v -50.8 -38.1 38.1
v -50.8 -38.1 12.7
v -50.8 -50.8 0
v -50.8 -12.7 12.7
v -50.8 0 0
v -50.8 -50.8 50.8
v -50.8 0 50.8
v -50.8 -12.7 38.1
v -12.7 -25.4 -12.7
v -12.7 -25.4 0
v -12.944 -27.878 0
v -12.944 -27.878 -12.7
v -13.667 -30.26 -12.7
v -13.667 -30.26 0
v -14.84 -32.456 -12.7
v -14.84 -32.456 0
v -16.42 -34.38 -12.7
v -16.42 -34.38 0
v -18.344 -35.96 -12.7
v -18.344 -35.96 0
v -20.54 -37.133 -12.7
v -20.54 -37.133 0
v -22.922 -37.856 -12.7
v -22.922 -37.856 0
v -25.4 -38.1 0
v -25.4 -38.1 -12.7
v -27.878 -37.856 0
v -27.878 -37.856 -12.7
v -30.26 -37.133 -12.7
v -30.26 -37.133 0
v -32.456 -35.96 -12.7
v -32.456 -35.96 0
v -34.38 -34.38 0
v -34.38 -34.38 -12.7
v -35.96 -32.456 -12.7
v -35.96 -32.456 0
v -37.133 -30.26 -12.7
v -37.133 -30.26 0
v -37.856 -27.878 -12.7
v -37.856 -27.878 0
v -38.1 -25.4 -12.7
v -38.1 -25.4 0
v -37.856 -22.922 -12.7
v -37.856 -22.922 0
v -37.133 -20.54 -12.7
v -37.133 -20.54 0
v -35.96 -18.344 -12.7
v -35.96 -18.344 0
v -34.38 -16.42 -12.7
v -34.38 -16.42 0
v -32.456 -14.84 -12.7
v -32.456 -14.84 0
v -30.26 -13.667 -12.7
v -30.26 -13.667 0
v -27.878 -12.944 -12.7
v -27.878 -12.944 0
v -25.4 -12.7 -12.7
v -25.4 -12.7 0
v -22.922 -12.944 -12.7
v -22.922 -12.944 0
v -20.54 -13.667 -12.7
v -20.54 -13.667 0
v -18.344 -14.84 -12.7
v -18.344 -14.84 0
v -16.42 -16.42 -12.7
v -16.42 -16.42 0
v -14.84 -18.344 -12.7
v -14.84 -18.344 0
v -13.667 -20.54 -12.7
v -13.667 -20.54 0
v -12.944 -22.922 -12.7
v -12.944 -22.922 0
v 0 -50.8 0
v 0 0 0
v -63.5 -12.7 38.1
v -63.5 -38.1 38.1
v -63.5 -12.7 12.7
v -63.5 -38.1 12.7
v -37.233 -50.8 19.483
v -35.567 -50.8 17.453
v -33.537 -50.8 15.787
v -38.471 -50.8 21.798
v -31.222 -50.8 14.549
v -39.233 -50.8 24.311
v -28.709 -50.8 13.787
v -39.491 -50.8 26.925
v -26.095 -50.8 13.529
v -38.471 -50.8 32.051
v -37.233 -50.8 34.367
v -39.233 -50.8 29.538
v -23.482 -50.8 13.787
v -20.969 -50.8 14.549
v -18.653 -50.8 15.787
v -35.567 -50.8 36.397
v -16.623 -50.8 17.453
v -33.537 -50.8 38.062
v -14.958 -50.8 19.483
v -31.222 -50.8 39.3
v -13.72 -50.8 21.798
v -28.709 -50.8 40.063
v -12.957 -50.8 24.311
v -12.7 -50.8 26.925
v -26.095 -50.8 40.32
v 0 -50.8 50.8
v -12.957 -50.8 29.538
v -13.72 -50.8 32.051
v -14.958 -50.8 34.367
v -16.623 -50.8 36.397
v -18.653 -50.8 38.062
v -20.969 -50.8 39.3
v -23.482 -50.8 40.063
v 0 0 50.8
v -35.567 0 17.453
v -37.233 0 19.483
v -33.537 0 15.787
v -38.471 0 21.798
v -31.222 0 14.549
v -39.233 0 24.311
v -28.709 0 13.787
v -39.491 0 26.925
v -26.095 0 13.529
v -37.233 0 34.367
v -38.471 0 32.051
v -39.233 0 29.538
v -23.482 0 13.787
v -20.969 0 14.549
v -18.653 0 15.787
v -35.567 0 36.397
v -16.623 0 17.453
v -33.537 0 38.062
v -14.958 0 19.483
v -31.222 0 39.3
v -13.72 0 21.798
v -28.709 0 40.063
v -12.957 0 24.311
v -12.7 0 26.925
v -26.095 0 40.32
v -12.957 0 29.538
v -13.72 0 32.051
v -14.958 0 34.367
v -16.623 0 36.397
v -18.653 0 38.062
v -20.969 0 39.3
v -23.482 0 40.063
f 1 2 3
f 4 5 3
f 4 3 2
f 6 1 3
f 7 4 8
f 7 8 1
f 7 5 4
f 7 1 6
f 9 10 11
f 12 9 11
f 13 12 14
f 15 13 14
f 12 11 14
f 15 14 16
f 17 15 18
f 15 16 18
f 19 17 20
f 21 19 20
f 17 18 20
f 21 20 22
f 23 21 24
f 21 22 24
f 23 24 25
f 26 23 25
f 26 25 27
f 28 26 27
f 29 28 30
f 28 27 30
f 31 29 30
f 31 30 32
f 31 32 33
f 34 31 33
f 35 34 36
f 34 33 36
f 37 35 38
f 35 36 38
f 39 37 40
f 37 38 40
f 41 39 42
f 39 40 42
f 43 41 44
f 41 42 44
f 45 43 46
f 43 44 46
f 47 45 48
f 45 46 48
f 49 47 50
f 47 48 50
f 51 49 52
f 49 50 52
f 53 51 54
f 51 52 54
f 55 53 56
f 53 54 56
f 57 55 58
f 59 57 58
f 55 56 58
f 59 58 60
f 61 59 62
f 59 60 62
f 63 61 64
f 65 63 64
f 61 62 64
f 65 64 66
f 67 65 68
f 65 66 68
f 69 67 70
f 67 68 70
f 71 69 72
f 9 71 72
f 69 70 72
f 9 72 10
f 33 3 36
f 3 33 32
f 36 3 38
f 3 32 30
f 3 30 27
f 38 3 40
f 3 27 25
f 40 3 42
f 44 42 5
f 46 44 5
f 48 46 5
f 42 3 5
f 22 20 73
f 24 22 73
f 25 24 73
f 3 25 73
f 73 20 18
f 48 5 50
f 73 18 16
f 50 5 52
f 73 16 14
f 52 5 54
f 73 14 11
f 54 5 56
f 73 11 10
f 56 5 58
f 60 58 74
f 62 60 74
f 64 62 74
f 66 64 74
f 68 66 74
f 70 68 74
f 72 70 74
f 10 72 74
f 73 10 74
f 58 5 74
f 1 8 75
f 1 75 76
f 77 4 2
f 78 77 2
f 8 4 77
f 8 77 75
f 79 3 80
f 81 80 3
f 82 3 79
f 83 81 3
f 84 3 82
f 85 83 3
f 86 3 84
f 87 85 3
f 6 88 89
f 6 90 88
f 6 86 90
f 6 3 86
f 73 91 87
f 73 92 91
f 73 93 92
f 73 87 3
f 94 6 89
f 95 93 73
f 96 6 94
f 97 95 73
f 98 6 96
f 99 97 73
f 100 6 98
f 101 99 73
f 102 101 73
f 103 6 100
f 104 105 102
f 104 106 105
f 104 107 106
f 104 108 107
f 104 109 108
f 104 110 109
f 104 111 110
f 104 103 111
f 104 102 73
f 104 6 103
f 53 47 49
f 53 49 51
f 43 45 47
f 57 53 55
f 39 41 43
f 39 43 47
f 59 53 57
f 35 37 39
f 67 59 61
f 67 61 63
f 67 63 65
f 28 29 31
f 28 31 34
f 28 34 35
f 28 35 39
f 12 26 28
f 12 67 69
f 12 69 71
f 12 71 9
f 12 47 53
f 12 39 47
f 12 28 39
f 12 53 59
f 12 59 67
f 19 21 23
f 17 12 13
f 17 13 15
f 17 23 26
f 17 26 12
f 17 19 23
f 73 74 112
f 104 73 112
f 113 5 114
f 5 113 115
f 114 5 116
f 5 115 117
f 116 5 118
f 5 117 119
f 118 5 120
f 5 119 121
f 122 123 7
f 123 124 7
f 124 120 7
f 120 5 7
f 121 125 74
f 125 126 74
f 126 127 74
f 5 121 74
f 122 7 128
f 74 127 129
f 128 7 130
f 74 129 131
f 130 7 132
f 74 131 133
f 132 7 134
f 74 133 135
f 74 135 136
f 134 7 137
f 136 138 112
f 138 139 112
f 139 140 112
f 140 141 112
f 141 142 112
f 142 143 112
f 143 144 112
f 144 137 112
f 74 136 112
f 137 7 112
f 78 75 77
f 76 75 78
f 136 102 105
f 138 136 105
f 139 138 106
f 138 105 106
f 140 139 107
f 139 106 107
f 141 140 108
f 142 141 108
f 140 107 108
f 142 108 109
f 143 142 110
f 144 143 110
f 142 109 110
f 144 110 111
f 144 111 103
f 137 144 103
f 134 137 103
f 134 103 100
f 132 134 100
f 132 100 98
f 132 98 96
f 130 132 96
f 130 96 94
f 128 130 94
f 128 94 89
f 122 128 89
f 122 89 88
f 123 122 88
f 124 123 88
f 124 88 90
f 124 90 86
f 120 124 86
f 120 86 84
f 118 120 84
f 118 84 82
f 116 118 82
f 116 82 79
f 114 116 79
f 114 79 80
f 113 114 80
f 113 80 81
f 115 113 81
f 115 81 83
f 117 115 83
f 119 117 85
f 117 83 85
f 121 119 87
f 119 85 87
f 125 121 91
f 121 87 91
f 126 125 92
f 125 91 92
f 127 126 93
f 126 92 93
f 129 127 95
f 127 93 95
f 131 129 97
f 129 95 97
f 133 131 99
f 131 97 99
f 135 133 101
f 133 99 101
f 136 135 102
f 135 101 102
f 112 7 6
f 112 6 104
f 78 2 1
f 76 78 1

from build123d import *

# Parameters (mm, degrees)
F0_W     = 50.8
F0_H     = 50.8
F1_DEPTH = 50.8
F2_R     = 13.395396
F3_DEPTH = 61.722
F4_W     = 25.4
F4_H     = 25.4
F5_DEPTH = 12.7
F6_R     = 12.7
F7_DEPTH = 12.7


with BuildPart() as f1:
    # F0 (on Front) → F1 (new body)
    with BuildSketch(Plane.XZ):
        with Locations((-25.4, 25.4)):
            Rectangle(F0_W, F0_H)
    extrude(amount=F1_DEPTH)

    # F2 (on face) → F3 (cut)
    with BuildSketch(Plane.XZ.offset(50.8)):
        with Locations((-26.095396, 26.924606)):
            Circle(F2_R)
    extrude(amount=-F3_DEPTH, mode=Mode.SUBTRACT)

    # F4 (on face) → F5 (join)
    with BuildSketch(Plane(origin=(-50.8, 0, 0), x_dir=(0, -1, 0), z_dir=(-1, 0, 0))):
        with Locations((25.4, 25.4)):
            Rectangle(F4_W, F4_H)
    extrude(amount=F5_DEPTH)

    # F6 (on face) → F7 (join)
    with BuildSketch(Plane(origin=(0, 0, 0), x_dir=(1, 0, 0), z_dir=(0, 0, -1))):
        with Locations((-25.4, 25.4)):
            Circle(F6_R)
    extrude(amount=F7_DEPTH)


solid = f1.part
